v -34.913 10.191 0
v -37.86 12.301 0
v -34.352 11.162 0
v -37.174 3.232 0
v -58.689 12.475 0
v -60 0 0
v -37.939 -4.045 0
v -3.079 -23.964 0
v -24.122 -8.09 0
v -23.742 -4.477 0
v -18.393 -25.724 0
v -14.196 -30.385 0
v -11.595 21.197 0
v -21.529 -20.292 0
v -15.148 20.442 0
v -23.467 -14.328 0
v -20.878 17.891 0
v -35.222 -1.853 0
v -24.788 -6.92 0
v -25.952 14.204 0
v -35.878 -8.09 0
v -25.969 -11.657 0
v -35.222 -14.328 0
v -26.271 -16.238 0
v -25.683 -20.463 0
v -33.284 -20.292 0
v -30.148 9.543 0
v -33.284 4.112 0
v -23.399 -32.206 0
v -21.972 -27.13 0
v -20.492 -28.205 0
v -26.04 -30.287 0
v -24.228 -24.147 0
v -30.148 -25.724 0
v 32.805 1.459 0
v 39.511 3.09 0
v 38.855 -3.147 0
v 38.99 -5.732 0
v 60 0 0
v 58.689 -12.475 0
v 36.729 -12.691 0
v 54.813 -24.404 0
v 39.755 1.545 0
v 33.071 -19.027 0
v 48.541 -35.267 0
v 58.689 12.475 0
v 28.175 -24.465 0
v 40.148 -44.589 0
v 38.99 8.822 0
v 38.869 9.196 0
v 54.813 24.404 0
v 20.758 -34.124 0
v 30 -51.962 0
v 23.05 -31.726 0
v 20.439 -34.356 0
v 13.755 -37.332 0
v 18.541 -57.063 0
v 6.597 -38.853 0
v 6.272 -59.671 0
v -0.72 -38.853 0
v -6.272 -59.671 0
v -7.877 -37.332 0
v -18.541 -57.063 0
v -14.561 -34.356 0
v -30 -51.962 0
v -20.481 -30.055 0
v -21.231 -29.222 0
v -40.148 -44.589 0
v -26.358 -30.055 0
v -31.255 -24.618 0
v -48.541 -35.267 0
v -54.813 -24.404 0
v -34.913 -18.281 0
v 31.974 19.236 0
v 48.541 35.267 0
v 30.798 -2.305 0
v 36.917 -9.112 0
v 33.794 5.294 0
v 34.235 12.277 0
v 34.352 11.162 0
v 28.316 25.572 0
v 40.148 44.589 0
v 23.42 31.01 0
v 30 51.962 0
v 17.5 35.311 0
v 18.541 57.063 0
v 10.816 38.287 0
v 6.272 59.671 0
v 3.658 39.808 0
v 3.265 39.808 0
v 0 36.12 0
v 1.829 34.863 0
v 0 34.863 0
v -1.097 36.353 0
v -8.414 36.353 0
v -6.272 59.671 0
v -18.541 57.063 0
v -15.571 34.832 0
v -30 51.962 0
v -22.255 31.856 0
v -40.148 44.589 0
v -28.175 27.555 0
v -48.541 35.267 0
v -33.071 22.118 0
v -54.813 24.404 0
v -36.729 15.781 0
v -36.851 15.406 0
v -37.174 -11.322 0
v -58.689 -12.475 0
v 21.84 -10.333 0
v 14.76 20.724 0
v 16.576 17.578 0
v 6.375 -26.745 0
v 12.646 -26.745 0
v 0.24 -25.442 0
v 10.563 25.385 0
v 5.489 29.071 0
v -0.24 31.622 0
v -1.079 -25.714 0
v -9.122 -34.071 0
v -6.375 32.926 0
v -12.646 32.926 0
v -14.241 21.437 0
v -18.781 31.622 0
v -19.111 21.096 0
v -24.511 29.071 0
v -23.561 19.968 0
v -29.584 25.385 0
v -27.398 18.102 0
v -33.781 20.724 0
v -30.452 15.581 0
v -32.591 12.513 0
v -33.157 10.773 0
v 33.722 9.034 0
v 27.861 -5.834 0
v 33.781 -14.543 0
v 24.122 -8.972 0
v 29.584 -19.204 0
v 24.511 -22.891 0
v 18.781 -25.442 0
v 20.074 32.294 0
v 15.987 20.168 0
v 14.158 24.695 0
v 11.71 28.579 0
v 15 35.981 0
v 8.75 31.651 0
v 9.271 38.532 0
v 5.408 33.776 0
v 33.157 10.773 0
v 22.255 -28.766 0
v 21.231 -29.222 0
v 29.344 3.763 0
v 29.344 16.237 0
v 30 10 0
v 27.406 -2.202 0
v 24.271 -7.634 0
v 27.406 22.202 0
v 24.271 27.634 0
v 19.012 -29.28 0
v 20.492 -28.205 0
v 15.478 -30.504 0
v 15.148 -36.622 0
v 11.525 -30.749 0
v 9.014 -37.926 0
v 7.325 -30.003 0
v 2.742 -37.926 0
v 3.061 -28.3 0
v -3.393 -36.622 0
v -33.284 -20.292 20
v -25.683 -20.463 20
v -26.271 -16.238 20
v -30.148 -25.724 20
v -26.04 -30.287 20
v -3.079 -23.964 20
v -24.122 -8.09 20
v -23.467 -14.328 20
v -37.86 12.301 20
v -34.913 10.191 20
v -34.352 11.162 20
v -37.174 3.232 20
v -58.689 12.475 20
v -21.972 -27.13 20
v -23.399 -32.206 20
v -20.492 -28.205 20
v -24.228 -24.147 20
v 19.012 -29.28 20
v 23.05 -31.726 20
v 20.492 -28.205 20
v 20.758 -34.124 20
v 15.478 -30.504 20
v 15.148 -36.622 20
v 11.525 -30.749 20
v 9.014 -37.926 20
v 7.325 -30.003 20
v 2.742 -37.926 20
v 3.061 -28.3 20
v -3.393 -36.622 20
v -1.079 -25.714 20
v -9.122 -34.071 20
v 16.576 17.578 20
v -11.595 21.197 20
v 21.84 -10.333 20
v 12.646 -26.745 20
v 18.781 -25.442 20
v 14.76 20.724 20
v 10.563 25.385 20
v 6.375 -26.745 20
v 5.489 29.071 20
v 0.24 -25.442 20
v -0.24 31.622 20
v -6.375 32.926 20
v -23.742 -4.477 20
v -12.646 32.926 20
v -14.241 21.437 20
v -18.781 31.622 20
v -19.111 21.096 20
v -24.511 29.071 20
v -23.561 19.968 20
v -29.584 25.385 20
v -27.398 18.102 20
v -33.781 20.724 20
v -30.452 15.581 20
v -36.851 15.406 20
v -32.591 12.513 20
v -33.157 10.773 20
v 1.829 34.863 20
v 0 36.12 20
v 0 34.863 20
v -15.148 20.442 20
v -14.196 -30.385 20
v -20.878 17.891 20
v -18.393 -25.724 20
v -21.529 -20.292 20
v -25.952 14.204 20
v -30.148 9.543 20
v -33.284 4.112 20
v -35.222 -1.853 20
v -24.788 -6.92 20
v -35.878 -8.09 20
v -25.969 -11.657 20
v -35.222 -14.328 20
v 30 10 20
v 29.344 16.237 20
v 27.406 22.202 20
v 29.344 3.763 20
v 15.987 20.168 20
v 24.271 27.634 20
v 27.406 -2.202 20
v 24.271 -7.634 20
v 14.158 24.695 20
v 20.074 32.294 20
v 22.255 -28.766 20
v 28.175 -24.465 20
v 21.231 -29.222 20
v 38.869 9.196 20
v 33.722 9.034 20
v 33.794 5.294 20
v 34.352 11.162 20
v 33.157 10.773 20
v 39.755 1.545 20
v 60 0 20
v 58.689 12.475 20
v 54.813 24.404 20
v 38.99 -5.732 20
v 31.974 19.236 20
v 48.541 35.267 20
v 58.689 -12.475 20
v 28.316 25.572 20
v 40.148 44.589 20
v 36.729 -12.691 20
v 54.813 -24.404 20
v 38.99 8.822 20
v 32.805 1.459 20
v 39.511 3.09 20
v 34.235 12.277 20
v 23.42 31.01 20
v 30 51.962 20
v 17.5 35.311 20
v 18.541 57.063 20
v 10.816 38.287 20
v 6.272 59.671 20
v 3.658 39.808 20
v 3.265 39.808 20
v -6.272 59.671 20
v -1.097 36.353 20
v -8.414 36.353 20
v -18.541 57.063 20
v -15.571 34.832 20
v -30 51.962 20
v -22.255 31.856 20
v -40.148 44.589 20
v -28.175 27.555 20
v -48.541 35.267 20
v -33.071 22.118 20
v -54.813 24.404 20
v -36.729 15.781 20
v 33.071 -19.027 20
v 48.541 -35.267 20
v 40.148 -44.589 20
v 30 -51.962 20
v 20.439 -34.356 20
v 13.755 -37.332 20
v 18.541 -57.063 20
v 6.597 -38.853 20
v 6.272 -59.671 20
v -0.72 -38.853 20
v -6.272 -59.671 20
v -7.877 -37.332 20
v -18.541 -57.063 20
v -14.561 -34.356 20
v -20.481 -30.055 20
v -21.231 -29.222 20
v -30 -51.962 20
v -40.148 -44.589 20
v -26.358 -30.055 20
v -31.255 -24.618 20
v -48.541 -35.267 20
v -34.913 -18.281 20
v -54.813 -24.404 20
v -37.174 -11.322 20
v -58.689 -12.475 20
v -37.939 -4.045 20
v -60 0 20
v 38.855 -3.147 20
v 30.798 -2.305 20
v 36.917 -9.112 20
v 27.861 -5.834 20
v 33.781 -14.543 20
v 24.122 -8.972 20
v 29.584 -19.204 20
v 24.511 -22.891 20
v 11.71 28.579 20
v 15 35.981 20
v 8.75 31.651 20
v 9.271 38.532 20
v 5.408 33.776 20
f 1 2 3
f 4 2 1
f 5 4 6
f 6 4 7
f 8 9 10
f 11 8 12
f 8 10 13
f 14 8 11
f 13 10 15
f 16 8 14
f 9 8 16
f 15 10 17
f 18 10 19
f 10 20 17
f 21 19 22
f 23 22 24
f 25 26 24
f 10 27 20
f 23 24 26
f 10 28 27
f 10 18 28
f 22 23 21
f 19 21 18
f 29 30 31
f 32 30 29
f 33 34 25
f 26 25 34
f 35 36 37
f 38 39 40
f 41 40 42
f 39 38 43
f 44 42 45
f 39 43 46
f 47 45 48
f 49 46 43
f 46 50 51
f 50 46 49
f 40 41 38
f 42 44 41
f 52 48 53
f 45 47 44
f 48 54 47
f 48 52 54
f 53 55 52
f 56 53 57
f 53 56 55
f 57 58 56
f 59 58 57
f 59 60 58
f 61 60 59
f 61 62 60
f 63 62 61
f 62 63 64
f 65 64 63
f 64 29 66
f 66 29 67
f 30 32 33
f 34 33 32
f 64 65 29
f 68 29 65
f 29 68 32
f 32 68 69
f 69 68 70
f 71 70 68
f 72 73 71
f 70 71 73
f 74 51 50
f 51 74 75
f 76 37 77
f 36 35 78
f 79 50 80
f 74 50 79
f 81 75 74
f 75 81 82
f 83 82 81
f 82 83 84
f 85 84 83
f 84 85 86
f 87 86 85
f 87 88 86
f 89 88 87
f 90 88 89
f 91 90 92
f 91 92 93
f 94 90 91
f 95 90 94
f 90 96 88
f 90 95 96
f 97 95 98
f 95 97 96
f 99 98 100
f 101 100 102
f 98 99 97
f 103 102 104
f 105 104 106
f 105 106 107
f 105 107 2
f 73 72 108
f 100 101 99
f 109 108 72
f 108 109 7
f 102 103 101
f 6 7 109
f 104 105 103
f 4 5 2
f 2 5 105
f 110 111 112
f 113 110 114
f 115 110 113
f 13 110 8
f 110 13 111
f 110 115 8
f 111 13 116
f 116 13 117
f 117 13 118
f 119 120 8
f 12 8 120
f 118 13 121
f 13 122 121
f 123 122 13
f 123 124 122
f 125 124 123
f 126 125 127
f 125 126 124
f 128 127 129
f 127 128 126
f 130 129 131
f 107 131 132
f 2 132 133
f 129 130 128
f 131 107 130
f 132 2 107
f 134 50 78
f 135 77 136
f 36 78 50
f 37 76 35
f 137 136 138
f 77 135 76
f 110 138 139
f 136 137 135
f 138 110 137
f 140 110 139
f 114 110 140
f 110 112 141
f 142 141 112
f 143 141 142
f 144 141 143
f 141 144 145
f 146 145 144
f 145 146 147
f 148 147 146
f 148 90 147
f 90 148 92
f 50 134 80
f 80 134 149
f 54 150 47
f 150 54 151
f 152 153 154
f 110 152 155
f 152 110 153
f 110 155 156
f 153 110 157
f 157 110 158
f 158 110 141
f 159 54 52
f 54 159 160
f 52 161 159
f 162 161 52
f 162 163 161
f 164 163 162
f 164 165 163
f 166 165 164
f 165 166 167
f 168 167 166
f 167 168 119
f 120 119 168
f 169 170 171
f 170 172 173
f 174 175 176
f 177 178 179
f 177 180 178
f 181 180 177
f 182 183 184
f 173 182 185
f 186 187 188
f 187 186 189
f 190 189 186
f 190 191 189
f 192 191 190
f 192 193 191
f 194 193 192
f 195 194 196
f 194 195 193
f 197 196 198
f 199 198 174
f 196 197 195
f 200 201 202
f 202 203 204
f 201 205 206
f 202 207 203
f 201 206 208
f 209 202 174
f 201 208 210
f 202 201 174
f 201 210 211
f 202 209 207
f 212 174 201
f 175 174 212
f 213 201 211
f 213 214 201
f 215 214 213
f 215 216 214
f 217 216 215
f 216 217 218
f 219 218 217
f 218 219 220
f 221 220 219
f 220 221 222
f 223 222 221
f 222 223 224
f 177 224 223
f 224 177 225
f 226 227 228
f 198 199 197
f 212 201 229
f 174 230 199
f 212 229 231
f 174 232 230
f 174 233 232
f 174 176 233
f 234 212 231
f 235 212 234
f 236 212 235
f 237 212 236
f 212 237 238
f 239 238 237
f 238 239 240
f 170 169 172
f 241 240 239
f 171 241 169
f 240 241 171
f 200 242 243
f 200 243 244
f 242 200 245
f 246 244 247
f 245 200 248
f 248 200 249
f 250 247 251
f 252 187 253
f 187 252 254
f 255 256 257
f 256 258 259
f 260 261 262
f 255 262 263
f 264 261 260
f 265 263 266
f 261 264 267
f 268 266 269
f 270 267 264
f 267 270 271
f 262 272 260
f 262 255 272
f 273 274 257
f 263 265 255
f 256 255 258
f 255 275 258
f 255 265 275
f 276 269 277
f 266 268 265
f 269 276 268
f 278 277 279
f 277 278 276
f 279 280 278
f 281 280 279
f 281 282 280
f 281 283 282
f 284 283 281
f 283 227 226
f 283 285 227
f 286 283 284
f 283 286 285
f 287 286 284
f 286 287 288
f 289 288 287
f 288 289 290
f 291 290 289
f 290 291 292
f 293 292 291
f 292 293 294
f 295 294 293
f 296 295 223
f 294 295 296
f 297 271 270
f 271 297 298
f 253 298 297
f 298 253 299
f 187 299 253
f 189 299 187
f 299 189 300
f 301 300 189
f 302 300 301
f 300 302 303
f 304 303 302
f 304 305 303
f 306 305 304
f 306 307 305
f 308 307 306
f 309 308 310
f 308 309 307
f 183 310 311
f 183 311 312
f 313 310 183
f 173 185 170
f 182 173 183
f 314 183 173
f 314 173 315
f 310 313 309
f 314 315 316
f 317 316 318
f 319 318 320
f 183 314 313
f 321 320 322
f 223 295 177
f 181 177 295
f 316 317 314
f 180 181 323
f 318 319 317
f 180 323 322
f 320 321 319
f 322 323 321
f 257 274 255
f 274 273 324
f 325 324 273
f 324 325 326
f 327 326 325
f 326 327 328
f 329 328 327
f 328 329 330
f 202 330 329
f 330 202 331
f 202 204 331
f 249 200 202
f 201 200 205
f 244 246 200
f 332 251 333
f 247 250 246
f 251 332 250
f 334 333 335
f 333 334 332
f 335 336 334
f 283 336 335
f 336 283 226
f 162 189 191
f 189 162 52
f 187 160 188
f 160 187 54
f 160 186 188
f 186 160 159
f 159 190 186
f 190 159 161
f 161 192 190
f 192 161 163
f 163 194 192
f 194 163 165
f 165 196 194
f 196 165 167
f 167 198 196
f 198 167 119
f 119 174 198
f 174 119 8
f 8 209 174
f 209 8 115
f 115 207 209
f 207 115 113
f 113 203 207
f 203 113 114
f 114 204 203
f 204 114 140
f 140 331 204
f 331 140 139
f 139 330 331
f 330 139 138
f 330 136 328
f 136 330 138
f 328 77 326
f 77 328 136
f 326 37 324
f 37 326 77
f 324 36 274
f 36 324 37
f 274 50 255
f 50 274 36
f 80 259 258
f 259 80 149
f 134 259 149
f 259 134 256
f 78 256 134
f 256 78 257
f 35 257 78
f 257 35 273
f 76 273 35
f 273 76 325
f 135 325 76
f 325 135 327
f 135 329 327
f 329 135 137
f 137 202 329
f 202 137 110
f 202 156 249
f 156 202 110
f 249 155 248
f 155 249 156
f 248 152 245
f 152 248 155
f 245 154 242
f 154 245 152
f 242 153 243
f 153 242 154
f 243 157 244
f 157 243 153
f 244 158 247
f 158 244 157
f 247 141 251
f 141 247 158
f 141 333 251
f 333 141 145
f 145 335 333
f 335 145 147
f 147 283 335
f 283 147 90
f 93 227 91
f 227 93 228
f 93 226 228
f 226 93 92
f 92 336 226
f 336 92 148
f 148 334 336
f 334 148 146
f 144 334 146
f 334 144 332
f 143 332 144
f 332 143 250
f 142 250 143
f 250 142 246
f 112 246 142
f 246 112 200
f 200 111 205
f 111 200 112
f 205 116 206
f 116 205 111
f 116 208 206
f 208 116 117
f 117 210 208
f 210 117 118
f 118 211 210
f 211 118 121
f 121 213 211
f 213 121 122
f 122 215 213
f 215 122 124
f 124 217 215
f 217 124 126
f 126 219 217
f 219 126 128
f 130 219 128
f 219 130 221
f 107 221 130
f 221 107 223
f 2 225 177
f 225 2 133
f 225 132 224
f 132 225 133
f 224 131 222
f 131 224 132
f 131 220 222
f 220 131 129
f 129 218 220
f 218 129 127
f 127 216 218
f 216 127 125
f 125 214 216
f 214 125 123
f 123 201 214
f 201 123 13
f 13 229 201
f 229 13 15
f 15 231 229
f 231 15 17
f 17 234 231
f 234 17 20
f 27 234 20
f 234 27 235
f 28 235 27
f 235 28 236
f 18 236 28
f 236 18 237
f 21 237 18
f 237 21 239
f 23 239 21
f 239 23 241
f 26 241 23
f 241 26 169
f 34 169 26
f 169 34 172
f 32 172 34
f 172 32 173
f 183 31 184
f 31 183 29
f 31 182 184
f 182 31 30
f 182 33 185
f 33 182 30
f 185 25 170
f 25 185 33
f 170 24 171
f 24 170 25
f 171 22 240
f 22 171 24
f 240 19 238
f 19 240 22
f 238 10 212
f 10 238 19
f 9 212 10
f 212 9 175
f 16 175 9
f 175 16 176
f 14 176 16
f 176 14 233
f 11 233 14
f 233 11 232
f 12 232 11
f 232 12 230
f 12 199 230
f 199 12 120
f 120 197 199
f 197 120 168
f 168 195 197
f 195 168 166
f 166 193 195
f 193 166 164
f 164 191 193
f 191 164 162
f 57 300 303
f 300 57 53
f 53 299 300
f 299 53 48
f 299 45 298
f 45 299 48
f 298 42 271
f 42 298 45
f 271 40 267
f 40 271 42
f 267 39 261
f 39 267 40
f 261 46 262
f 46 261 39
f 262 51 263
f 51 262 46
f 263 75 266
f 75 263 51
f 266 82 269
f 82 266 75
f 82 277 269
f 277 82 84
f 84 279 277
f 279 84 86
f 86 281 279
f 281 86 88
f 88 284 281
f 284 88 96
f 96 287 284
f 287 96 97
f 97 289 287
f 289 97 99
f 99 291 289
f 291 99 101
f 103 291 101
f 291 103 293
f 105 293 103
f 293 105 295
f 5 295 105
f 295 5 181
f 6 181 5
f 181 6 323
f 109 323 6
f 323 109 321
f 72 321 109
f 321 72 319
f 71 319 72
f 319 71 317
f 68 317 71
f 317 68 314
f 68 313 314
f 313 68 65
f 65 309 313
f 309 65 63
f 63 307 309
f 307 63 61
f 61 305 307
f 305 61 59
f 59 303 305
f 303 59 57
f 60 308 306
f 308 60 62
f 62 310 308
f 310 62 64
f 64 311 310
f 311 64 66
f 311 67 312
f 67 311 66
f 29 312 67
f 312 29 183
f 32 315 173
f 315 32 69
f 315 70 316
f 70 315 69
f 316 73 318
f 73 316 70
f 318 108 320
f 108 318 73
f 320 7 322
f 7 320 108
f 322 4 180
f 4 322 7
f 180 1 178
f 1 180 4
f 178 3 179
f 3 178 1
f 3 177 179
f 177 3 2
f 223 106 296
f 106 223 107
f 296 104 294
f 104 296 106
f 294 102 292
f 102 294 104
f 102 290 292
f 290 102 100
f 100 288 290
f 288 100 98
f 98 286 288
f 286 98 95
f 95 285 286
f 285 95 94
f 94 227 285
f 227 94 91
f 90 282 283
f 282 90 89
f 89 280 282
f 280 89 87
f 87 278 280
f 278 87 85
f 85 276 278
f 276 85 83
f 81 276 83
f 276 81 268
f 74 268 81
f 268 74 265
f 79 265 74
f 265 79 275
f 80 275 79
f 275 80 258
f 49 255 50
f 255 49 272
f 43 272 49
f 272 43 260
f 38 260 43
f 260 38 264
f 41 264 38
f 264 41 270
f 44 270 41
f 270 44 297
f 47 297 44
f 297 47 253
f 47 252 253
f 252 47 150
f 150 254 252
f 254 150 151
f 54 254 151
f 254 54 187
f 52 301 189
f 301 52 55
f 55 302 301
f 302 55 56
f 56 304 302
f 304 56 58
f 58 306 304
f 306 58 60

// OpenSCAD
//The whole thing rotates, just the inner part of it rotates if against pressure.

h= 20;

d=5; //Distance pushed in.

ro = 60;
ri = 40;
rd = d;

ra = ri/2;

n = 5;

module cut_base()
{
    for( a= [ 0 : 360/n :360 ] )
    {
        rotate(a=a) translate([0,d]) difference()
        {
            circle(ri-d);
            translate([-ro,0]) square(2*[ro,ro], center=true);
        }
    }
}

module rot_base()
{
    r = (ri+ra)/2;
    circle(ra);
    for( a= [ 0 : 360/n :360 ] )
    {
        rotate(a=a) translate([0,ri-r]) difference()
        {
            circle(r);
            translate([-ro,0]) square(2*[ro,ro], center=true);
            scale([0.7,1]) circle(r-rd);
        }
    }
}
color([1,0,0]) linear_extrude(height=h) rot_base();

linear_extrude(height=h)
difference()
{ 
    circle(ro);
    cut_base();
}
